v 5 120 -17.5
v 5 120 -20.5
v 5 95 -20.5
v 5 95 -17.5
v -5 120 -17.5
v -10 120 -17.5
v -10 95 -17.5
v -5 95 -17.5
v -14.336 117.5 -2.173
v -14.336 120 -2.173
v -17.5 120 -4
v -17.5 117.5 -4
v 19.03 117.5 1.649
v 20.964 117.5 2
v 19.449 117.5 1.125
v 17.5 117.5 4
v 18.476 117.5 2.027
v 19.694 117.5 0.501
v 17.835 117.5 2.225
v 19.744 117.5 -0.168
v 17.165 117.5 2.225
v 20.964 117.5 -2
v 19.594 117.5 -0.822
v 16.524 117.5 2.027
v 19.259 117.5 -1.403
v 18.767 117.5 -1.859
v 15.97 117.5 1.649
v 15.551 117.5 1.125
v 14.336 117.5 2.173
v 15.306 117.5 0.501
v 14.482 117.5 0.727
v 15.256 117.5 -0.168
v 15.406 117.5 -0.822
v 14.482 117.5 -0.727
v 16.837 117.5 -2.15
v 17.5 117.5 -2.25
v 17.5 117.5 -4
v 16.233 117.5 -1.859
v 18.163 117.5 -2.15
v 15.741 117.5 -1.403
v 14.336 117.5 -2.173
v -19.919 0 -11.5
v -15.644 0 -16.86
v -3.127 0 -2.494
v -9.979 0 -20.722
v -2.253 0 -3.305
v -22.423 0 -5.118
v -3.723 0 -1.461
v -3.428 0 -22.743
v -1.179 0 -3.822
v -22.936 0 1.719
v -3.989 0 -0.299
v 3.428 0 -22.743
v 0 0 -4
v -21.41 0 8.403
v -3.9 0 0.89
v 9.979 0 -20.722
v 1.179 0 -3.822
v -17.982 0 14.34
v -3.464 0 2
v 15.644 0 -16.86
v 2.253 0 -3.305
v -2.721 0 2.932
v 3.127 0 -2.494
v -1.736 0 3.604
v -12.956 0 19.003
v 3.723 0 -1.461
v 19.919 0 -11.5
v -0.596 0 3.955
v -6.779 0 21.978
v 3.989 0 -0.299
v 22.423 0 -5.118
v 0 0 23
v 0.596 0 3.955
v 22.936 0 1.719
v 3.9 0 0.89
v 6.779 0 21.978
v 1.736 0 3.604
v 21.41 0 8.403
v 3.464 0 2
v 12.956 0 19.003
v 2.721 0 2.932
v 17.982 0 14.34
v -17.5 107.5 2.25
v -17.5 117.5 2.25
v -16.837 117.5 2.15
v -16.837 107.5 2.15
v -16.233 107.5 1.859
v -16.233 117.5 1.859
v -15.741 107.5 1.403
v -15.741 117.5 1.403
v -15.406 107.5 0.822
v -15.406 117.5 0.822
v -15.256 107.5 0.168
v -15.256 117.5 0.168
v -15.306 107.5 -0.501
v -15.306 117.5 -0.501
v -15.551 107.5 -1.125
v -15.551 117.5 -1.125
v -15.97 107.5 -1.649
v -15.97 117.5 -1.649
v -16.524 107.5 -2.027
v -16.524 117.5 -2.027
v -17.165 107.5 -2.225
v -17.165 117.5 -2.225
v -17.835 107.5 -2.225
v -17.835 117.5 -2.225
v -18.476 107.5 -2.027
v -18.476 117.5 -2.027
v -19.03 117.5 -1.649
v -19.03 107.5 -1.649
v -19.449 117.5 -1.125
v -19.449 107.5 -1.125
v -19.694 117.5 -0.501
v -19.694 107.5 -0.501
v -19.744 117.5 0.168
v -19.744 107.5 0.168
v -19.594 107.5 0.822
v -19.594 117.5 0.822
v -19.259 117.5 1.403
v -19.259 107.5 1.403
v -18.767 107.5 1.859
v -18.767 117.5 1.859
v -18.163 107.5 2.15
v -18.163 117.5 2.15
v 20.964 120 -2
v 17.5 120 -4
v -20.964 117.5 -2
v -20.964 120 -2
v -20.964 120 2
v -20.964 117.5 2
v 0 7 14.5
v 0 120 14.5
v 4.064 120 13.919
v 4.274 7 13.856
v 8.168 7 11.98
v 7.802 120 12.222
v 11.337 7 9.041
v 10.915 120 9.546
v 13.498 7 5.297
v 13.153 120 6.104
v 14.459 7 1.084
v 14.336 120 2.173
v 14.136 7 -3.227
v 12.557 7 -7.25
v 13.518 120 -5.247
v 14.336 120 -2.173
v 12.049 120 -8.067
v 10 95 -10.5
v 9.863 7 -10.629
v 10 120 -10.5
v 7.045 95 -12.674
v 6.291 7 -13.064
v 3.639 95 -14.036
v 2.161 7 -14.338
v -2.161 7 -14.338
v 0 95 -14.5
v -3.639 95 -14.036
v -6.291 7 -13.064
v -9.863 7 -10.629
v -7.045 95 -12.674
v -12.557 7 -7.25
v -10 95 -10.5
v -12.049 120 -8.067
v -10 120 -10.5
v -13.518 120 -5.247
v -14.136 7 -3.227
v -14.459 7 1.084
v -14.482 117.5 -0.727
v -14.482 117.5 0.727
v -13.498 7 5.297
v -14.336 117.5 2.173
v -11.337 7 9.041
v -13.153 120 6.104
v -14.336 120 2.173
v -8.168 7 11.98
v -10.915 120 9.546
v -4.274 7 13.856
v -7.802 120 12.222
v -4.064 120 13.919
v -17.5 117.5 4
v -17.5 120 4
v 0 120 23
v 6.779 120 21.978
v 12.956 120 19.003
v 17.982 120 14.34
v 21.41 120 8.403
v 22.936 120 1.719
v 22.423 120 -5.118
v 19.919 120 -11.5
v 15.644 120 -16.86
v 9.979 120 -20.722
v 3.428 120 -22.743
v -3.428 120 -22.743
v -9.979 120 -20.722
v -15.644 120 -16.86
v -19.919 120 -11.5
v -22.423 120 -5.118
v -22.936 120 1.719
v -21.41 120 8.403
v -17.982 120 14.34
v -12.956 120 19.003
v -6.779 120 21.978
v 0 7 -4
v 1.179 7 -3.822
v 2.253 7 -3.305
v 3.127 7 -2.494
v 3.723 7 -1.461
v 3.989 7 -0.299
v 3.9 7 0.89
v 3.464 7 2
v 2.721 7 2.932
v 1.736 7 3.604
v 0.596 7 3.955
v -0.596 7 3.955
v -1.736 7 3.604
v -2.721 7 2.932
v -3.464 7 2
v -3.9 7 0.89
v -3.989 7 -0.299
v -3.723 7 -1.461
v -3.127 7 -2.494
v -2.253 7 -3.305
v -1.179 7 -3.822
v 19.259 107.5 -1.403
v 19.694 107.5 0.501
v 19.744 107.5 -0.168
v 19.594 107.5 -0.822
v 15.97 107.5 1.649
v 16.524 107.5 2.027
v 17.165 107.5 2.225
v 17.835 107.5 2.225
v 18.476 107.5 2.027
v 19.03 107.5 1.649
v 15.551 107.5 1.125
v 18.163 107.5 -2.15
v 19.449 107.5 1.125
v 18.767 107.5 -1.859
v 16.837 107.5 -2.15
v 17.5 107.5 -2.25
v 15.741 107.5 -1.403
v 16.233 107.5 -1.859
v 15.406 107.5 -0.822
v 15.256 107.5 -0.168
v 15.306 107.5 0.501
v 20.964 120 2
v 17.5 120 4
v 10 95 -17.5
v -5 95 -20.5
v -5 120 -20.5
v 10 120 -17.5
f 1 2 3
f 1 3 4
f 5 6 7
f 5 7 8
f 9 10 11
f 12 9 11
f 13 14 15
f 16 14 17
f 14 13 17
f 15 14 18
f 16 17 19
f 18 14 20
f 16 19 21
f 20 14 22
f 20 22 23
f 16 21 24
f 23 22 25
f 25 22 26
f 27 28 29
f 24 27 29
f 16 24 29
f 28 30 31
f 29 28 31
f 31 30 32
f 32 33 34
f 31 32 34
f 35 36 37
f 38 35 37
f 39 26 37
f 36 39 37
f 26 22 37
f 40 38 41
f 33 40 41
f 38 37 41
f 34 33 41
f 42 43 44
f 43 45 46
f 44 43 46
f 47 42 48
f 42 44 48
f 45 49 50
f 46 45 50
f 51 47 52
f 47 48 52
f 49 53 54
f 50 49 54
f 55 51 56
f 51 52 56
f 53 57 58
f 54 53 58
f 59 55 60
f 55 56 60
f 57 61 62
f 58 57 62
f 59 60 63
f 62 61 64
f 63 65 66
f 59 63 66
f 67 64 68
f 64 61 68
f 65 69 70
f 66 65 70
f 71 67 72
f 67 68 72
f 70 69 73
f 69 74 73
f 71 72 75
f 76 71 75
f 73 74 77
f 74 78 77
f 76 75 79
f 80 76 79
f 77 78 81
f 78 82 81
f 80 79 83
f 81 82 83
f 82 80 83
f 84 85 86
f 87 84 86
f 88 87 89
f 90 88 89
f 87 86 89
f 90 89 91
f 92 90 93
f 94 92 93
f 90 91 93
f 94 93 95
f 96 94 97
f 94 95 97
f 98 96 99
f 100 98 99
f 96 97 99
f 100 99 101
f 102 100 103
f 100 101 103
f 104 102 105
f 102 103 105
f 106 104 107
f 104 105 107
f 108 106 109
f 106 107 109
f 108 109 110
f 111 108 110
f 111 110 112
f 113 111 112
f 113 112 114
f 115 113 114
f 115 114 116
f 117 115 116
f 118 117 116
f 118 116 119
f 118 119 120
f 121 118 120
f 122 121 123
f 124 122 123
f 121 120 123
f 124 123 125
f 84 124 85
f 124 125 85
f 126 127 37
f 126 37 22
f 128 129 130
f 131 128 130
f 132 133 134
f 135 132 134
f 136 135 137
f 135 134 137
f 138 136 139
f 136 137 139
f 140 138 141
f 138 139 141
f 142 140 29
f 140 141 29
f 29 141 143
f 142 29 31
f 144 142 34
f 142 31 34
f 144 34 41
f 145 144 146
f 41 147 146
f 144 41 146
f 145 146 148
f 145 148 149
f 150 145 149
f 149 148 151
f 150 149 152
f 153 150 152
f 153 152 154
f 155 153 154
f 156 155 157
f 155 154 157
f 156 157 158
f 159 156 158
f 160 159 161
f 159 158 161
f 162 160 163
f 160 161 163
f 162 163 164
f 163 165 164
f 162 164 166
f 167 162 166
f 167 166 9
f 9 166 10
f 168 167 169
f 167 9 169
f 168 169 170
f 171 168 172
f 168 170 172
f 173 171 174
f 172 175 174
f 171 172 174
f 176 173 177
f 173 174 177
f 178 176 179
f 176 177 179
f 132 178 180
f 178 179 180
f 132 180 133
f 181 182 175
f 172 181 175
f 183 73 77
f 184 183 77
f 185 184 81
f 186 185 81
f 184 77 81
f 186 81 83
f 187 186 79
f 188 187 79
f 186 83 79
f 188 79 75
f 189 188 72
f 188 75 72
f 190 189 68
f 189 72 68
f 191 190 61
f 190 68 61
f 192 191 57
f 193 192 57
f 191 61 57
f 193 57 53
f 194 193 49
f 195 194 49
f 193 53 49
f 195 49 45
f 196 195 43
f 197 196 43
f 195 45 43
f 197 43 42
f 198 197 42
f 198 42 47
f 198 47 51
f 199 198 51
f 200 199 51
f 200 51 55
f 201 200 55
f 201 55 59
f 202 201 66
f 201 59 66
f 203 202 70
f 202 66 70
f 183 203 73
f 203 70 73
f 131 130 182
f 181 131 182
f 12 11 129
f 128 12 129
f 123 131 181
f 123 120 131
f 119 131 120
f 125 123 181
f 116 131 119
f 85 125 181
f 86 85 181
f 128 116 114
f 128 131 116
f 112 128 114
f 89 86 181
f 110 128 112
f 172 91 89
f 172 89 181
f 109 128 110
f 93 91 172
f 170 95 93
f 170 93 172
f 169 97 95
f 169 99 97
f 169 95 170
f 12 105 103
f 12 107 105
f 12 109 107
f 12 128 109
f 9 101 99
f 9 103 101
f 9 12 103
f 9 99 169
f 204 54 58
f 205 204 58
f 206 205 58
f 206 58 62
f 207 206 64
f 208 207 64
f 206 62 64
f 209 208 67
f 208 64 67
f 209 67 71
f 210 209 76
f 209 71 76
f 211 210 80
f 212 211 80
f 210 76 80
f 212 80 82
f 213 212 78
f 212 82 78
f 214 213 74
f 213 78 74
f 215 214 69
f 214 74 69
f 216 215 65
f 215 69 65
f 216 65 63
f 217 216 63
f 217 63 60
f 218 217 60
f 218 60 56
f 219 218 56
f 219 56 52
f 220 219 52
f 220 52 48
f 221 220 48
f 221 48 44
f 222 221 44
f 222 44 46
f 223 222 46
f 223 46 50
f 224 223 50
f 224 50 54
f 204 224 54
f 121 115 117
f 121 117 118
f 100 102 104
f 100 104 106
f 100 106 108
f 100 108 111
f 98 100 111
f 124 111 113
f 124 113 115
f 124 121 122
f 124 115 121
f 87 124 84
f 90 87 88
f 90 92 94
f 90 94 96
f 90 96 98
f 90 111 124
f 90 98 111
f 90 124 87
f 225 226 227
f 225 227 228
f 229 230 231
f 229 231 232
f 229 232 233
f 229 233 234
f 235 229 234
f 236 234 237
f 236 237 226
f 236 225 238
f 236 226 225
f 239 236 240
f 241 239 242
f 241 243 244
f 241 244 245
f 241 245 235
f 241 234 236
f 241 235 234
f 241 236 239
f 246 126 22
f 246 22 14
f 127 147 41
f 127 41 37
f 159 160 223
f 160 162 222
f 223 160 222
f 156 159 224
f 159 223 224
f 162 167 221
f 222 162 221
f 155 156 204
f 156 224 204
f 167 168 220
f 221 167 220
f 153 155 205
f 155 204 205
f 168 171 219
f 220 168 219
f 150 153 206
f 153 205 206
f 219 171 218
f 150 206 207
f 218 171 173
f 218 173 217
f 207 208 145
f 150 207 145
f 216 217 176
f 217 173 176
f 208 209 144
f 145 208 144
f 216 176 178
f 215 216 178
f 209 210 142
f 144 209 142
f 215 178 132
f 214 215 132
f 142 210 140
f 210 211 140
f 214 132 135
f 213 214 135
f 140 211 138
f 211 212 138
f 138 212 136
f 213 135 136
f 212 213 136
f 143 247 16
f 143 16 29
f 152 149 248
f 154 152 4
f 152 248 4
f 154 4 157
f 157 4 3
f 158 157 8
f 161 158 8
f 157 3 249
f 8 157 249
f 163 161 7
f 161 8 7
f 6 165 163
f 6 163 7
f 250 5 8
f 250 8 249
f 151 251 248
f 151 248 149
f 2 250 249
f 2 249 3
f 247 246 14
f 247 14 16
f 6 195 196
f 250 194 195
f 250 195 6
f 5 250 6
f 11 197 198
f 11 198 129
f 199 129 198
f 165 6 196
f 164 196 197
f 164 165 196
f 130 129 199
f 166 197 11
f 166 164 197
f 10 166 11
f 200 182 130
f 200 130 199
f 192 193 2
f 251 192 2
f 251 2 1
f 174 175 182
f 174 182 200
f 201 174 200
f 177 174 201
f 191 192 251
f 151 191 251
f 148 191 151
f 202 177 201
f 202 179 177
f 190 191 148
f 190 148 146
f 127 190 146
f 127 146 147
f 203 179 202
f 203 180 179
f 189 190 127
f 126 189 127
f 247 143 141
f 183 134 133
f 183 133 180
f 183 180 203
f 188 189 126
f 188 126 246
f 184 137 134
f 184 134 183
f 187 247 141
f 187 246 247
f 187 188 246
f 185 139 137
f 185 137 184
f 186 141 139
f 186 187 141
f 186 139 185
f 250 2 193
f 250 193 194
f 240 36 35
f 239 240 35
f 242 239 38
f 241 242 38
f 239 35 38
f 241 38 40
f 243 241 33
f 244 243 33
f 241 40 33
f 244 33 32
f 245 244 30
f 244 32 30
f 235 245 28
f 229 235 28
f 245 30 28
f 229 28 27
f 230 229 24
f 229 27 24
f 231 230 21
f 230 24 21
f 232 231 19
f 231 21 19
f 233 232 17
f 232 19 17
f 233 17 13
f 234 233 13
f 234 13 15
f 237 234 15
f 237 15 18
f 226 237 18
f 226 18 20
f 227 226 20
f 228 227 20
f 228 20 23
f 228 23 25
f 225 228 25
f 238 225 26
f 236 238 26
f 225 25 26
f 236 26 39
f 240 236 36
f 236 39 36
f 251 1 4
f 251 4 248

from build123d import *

# Parameters (mm, degrees)
SKETCH1_R           = 23
BOSS_EXTRUDE1_DEPTH = 120
SKETCH2_R           = 14.5
CUT_EXTRUDE1_DEPTH  = 120
CUT_EXTRUDE2_DEPTH  = 2.5
SKETCH5_R           = 2.25
CUT_EXTRUDE3_DEPTH  = 10
BOSS_EXTRUDE2_START = -7
SKETCH6_R           = 14.5
BOSS_EXTRUDE2_DEPTH = 7
SKETCH7_R           = 4
CUT_EXTRUDE4_DEPTH  = 15
CUT_EXTRUDE6_DEPTH  = 25
CUT_EXTRUDE7_DEPTH  = 25


with BuildPart() as part:
    # Sketch1 → Boss-Extrude1 (new body)
    with BuildSketch(Plane(origin=(0, 0, 0), x_dir=(1, 0, 0), z_dir=(0, 1, 0))):
        with Locations(Location((0, 0, 0), (0, 0, 270))):
            Circle(SKETCH1_R)
    extrude(amount=BOSS_EXTRUDE1_DEPTH)

    # Sketch2 → Cut-Extrude1 (cut)
    with BuildSketch(Plane(origin=(0, 120, 0), x_dir=(1, 0, 0), z_dir=(0, 1, 0))):
        with Locations(Location((0, 0, 0), (0, 0, 270))):
            Circle(SKETCH2_R)
    extrude(amount=-CUT_EXTRUDE1_DEPTH, mode=Mode.SUBTRACT)

    # Sketch4 → Cut-Extrude2 (cut)
    with BuildSketch(Plane(origin=(0, 120, 0), x_dir=(1, 0, 0), z_dir=(0, 1, 0))):
        Polygon((-17.5, 4), (-20.964101615, 2), (-20.964101615, -2), (-17.5, -4), (-14.035898385, -2), (-14.035898385, 2), align=None)
        Polygon((14.035898385, 2), (17.5, 4), (20.964101615, 2), (20.964101615, -2), (17.5, -4), (14.035898385, -2), align=None)
    extrude(amount=-CUT_EXTRUDE2_DEPTH, mode=Mode.SUBTRACT)

    # Sketch5 → Cut-Extrude3 (cut)
    with BuildSketch(Plane(origin=(0, 117.5, 0), x_dir=(1, 0, 0), z_dir=(0, 1, 0))):
        with Locations(Location((-17.5, 0, 0), (0, 0, 270))):
            Circle(SKETCH5_R)
        with Locations(Location((17.5, 0, 0), (0, 0, 90))):
            Circle(SKETCH5_R)
    extrude(amount=-CUT_EXTRUDE3_DEPTH, mode=Mode.SUBTRACT)

    # Sketch6 → Boss-Extrude2 (add)
    with BuildSketch(Plane(origin=(0, 0, 0), x_dir=(-1, 0, 0), z_dir=(0, -1, 0)).offset(BOSS_EXTRUDE2_START)):
        with Locations(Location((0, 0, 0), (0, 0, 188.620433548))):
            Circle(SKETCH6_R)
    extrude(amount=BOSS_EXTRUDE2_DEPTH)

    # Sketch7 → Cut-Extrude4 (cut)
    with BuildSketch(Plane.XZ):
        with Locations(Location((0, 0, 0), (0, 0, 270))):
            Circle(SKETCH7_R)
    extrude(amount=-CUT_EXTRUDE4_DEPTH, mode=Mode.SUBTRACT)

    # Sketch8 → Cut-Extrude6 (cut)
    with BuildSketch(Plane(origin=(0, 120, 0), x_dir=(1, 0, 0), z_dir=(0, 1, 0))):
        with BuildLine():
            Line((-10, 10.5), (-10, 17.5))
            Line((-10, 17.5), (10, 17.5))
            Line((10, 17.5), (10, 10.5))
            ThreePointArc((10, 10.5), (0, 14.5), (-10, 10.5))
        make_face()
    extrude(amount=-CUT_EXTRUDE6_DEPTH, mode=Mode.SUBTRACT)

    # Sketch9 → Cut-Extrude7 (cut)
    with BuildSketch(Plane(origin=(0, 120, 0), x_dir=(1, 0, 0), z_dir=(0, 1, 0))):
        Polygon((0, 17.5), (-5, 17.5), (-5, 20.5), (5, 20.5), (5, 17.5), align=None)
    extrude(amount=-CUT_EXTRUDE7_DEPTH, mode=Mode.SUBTRACT)


solid = part.part
